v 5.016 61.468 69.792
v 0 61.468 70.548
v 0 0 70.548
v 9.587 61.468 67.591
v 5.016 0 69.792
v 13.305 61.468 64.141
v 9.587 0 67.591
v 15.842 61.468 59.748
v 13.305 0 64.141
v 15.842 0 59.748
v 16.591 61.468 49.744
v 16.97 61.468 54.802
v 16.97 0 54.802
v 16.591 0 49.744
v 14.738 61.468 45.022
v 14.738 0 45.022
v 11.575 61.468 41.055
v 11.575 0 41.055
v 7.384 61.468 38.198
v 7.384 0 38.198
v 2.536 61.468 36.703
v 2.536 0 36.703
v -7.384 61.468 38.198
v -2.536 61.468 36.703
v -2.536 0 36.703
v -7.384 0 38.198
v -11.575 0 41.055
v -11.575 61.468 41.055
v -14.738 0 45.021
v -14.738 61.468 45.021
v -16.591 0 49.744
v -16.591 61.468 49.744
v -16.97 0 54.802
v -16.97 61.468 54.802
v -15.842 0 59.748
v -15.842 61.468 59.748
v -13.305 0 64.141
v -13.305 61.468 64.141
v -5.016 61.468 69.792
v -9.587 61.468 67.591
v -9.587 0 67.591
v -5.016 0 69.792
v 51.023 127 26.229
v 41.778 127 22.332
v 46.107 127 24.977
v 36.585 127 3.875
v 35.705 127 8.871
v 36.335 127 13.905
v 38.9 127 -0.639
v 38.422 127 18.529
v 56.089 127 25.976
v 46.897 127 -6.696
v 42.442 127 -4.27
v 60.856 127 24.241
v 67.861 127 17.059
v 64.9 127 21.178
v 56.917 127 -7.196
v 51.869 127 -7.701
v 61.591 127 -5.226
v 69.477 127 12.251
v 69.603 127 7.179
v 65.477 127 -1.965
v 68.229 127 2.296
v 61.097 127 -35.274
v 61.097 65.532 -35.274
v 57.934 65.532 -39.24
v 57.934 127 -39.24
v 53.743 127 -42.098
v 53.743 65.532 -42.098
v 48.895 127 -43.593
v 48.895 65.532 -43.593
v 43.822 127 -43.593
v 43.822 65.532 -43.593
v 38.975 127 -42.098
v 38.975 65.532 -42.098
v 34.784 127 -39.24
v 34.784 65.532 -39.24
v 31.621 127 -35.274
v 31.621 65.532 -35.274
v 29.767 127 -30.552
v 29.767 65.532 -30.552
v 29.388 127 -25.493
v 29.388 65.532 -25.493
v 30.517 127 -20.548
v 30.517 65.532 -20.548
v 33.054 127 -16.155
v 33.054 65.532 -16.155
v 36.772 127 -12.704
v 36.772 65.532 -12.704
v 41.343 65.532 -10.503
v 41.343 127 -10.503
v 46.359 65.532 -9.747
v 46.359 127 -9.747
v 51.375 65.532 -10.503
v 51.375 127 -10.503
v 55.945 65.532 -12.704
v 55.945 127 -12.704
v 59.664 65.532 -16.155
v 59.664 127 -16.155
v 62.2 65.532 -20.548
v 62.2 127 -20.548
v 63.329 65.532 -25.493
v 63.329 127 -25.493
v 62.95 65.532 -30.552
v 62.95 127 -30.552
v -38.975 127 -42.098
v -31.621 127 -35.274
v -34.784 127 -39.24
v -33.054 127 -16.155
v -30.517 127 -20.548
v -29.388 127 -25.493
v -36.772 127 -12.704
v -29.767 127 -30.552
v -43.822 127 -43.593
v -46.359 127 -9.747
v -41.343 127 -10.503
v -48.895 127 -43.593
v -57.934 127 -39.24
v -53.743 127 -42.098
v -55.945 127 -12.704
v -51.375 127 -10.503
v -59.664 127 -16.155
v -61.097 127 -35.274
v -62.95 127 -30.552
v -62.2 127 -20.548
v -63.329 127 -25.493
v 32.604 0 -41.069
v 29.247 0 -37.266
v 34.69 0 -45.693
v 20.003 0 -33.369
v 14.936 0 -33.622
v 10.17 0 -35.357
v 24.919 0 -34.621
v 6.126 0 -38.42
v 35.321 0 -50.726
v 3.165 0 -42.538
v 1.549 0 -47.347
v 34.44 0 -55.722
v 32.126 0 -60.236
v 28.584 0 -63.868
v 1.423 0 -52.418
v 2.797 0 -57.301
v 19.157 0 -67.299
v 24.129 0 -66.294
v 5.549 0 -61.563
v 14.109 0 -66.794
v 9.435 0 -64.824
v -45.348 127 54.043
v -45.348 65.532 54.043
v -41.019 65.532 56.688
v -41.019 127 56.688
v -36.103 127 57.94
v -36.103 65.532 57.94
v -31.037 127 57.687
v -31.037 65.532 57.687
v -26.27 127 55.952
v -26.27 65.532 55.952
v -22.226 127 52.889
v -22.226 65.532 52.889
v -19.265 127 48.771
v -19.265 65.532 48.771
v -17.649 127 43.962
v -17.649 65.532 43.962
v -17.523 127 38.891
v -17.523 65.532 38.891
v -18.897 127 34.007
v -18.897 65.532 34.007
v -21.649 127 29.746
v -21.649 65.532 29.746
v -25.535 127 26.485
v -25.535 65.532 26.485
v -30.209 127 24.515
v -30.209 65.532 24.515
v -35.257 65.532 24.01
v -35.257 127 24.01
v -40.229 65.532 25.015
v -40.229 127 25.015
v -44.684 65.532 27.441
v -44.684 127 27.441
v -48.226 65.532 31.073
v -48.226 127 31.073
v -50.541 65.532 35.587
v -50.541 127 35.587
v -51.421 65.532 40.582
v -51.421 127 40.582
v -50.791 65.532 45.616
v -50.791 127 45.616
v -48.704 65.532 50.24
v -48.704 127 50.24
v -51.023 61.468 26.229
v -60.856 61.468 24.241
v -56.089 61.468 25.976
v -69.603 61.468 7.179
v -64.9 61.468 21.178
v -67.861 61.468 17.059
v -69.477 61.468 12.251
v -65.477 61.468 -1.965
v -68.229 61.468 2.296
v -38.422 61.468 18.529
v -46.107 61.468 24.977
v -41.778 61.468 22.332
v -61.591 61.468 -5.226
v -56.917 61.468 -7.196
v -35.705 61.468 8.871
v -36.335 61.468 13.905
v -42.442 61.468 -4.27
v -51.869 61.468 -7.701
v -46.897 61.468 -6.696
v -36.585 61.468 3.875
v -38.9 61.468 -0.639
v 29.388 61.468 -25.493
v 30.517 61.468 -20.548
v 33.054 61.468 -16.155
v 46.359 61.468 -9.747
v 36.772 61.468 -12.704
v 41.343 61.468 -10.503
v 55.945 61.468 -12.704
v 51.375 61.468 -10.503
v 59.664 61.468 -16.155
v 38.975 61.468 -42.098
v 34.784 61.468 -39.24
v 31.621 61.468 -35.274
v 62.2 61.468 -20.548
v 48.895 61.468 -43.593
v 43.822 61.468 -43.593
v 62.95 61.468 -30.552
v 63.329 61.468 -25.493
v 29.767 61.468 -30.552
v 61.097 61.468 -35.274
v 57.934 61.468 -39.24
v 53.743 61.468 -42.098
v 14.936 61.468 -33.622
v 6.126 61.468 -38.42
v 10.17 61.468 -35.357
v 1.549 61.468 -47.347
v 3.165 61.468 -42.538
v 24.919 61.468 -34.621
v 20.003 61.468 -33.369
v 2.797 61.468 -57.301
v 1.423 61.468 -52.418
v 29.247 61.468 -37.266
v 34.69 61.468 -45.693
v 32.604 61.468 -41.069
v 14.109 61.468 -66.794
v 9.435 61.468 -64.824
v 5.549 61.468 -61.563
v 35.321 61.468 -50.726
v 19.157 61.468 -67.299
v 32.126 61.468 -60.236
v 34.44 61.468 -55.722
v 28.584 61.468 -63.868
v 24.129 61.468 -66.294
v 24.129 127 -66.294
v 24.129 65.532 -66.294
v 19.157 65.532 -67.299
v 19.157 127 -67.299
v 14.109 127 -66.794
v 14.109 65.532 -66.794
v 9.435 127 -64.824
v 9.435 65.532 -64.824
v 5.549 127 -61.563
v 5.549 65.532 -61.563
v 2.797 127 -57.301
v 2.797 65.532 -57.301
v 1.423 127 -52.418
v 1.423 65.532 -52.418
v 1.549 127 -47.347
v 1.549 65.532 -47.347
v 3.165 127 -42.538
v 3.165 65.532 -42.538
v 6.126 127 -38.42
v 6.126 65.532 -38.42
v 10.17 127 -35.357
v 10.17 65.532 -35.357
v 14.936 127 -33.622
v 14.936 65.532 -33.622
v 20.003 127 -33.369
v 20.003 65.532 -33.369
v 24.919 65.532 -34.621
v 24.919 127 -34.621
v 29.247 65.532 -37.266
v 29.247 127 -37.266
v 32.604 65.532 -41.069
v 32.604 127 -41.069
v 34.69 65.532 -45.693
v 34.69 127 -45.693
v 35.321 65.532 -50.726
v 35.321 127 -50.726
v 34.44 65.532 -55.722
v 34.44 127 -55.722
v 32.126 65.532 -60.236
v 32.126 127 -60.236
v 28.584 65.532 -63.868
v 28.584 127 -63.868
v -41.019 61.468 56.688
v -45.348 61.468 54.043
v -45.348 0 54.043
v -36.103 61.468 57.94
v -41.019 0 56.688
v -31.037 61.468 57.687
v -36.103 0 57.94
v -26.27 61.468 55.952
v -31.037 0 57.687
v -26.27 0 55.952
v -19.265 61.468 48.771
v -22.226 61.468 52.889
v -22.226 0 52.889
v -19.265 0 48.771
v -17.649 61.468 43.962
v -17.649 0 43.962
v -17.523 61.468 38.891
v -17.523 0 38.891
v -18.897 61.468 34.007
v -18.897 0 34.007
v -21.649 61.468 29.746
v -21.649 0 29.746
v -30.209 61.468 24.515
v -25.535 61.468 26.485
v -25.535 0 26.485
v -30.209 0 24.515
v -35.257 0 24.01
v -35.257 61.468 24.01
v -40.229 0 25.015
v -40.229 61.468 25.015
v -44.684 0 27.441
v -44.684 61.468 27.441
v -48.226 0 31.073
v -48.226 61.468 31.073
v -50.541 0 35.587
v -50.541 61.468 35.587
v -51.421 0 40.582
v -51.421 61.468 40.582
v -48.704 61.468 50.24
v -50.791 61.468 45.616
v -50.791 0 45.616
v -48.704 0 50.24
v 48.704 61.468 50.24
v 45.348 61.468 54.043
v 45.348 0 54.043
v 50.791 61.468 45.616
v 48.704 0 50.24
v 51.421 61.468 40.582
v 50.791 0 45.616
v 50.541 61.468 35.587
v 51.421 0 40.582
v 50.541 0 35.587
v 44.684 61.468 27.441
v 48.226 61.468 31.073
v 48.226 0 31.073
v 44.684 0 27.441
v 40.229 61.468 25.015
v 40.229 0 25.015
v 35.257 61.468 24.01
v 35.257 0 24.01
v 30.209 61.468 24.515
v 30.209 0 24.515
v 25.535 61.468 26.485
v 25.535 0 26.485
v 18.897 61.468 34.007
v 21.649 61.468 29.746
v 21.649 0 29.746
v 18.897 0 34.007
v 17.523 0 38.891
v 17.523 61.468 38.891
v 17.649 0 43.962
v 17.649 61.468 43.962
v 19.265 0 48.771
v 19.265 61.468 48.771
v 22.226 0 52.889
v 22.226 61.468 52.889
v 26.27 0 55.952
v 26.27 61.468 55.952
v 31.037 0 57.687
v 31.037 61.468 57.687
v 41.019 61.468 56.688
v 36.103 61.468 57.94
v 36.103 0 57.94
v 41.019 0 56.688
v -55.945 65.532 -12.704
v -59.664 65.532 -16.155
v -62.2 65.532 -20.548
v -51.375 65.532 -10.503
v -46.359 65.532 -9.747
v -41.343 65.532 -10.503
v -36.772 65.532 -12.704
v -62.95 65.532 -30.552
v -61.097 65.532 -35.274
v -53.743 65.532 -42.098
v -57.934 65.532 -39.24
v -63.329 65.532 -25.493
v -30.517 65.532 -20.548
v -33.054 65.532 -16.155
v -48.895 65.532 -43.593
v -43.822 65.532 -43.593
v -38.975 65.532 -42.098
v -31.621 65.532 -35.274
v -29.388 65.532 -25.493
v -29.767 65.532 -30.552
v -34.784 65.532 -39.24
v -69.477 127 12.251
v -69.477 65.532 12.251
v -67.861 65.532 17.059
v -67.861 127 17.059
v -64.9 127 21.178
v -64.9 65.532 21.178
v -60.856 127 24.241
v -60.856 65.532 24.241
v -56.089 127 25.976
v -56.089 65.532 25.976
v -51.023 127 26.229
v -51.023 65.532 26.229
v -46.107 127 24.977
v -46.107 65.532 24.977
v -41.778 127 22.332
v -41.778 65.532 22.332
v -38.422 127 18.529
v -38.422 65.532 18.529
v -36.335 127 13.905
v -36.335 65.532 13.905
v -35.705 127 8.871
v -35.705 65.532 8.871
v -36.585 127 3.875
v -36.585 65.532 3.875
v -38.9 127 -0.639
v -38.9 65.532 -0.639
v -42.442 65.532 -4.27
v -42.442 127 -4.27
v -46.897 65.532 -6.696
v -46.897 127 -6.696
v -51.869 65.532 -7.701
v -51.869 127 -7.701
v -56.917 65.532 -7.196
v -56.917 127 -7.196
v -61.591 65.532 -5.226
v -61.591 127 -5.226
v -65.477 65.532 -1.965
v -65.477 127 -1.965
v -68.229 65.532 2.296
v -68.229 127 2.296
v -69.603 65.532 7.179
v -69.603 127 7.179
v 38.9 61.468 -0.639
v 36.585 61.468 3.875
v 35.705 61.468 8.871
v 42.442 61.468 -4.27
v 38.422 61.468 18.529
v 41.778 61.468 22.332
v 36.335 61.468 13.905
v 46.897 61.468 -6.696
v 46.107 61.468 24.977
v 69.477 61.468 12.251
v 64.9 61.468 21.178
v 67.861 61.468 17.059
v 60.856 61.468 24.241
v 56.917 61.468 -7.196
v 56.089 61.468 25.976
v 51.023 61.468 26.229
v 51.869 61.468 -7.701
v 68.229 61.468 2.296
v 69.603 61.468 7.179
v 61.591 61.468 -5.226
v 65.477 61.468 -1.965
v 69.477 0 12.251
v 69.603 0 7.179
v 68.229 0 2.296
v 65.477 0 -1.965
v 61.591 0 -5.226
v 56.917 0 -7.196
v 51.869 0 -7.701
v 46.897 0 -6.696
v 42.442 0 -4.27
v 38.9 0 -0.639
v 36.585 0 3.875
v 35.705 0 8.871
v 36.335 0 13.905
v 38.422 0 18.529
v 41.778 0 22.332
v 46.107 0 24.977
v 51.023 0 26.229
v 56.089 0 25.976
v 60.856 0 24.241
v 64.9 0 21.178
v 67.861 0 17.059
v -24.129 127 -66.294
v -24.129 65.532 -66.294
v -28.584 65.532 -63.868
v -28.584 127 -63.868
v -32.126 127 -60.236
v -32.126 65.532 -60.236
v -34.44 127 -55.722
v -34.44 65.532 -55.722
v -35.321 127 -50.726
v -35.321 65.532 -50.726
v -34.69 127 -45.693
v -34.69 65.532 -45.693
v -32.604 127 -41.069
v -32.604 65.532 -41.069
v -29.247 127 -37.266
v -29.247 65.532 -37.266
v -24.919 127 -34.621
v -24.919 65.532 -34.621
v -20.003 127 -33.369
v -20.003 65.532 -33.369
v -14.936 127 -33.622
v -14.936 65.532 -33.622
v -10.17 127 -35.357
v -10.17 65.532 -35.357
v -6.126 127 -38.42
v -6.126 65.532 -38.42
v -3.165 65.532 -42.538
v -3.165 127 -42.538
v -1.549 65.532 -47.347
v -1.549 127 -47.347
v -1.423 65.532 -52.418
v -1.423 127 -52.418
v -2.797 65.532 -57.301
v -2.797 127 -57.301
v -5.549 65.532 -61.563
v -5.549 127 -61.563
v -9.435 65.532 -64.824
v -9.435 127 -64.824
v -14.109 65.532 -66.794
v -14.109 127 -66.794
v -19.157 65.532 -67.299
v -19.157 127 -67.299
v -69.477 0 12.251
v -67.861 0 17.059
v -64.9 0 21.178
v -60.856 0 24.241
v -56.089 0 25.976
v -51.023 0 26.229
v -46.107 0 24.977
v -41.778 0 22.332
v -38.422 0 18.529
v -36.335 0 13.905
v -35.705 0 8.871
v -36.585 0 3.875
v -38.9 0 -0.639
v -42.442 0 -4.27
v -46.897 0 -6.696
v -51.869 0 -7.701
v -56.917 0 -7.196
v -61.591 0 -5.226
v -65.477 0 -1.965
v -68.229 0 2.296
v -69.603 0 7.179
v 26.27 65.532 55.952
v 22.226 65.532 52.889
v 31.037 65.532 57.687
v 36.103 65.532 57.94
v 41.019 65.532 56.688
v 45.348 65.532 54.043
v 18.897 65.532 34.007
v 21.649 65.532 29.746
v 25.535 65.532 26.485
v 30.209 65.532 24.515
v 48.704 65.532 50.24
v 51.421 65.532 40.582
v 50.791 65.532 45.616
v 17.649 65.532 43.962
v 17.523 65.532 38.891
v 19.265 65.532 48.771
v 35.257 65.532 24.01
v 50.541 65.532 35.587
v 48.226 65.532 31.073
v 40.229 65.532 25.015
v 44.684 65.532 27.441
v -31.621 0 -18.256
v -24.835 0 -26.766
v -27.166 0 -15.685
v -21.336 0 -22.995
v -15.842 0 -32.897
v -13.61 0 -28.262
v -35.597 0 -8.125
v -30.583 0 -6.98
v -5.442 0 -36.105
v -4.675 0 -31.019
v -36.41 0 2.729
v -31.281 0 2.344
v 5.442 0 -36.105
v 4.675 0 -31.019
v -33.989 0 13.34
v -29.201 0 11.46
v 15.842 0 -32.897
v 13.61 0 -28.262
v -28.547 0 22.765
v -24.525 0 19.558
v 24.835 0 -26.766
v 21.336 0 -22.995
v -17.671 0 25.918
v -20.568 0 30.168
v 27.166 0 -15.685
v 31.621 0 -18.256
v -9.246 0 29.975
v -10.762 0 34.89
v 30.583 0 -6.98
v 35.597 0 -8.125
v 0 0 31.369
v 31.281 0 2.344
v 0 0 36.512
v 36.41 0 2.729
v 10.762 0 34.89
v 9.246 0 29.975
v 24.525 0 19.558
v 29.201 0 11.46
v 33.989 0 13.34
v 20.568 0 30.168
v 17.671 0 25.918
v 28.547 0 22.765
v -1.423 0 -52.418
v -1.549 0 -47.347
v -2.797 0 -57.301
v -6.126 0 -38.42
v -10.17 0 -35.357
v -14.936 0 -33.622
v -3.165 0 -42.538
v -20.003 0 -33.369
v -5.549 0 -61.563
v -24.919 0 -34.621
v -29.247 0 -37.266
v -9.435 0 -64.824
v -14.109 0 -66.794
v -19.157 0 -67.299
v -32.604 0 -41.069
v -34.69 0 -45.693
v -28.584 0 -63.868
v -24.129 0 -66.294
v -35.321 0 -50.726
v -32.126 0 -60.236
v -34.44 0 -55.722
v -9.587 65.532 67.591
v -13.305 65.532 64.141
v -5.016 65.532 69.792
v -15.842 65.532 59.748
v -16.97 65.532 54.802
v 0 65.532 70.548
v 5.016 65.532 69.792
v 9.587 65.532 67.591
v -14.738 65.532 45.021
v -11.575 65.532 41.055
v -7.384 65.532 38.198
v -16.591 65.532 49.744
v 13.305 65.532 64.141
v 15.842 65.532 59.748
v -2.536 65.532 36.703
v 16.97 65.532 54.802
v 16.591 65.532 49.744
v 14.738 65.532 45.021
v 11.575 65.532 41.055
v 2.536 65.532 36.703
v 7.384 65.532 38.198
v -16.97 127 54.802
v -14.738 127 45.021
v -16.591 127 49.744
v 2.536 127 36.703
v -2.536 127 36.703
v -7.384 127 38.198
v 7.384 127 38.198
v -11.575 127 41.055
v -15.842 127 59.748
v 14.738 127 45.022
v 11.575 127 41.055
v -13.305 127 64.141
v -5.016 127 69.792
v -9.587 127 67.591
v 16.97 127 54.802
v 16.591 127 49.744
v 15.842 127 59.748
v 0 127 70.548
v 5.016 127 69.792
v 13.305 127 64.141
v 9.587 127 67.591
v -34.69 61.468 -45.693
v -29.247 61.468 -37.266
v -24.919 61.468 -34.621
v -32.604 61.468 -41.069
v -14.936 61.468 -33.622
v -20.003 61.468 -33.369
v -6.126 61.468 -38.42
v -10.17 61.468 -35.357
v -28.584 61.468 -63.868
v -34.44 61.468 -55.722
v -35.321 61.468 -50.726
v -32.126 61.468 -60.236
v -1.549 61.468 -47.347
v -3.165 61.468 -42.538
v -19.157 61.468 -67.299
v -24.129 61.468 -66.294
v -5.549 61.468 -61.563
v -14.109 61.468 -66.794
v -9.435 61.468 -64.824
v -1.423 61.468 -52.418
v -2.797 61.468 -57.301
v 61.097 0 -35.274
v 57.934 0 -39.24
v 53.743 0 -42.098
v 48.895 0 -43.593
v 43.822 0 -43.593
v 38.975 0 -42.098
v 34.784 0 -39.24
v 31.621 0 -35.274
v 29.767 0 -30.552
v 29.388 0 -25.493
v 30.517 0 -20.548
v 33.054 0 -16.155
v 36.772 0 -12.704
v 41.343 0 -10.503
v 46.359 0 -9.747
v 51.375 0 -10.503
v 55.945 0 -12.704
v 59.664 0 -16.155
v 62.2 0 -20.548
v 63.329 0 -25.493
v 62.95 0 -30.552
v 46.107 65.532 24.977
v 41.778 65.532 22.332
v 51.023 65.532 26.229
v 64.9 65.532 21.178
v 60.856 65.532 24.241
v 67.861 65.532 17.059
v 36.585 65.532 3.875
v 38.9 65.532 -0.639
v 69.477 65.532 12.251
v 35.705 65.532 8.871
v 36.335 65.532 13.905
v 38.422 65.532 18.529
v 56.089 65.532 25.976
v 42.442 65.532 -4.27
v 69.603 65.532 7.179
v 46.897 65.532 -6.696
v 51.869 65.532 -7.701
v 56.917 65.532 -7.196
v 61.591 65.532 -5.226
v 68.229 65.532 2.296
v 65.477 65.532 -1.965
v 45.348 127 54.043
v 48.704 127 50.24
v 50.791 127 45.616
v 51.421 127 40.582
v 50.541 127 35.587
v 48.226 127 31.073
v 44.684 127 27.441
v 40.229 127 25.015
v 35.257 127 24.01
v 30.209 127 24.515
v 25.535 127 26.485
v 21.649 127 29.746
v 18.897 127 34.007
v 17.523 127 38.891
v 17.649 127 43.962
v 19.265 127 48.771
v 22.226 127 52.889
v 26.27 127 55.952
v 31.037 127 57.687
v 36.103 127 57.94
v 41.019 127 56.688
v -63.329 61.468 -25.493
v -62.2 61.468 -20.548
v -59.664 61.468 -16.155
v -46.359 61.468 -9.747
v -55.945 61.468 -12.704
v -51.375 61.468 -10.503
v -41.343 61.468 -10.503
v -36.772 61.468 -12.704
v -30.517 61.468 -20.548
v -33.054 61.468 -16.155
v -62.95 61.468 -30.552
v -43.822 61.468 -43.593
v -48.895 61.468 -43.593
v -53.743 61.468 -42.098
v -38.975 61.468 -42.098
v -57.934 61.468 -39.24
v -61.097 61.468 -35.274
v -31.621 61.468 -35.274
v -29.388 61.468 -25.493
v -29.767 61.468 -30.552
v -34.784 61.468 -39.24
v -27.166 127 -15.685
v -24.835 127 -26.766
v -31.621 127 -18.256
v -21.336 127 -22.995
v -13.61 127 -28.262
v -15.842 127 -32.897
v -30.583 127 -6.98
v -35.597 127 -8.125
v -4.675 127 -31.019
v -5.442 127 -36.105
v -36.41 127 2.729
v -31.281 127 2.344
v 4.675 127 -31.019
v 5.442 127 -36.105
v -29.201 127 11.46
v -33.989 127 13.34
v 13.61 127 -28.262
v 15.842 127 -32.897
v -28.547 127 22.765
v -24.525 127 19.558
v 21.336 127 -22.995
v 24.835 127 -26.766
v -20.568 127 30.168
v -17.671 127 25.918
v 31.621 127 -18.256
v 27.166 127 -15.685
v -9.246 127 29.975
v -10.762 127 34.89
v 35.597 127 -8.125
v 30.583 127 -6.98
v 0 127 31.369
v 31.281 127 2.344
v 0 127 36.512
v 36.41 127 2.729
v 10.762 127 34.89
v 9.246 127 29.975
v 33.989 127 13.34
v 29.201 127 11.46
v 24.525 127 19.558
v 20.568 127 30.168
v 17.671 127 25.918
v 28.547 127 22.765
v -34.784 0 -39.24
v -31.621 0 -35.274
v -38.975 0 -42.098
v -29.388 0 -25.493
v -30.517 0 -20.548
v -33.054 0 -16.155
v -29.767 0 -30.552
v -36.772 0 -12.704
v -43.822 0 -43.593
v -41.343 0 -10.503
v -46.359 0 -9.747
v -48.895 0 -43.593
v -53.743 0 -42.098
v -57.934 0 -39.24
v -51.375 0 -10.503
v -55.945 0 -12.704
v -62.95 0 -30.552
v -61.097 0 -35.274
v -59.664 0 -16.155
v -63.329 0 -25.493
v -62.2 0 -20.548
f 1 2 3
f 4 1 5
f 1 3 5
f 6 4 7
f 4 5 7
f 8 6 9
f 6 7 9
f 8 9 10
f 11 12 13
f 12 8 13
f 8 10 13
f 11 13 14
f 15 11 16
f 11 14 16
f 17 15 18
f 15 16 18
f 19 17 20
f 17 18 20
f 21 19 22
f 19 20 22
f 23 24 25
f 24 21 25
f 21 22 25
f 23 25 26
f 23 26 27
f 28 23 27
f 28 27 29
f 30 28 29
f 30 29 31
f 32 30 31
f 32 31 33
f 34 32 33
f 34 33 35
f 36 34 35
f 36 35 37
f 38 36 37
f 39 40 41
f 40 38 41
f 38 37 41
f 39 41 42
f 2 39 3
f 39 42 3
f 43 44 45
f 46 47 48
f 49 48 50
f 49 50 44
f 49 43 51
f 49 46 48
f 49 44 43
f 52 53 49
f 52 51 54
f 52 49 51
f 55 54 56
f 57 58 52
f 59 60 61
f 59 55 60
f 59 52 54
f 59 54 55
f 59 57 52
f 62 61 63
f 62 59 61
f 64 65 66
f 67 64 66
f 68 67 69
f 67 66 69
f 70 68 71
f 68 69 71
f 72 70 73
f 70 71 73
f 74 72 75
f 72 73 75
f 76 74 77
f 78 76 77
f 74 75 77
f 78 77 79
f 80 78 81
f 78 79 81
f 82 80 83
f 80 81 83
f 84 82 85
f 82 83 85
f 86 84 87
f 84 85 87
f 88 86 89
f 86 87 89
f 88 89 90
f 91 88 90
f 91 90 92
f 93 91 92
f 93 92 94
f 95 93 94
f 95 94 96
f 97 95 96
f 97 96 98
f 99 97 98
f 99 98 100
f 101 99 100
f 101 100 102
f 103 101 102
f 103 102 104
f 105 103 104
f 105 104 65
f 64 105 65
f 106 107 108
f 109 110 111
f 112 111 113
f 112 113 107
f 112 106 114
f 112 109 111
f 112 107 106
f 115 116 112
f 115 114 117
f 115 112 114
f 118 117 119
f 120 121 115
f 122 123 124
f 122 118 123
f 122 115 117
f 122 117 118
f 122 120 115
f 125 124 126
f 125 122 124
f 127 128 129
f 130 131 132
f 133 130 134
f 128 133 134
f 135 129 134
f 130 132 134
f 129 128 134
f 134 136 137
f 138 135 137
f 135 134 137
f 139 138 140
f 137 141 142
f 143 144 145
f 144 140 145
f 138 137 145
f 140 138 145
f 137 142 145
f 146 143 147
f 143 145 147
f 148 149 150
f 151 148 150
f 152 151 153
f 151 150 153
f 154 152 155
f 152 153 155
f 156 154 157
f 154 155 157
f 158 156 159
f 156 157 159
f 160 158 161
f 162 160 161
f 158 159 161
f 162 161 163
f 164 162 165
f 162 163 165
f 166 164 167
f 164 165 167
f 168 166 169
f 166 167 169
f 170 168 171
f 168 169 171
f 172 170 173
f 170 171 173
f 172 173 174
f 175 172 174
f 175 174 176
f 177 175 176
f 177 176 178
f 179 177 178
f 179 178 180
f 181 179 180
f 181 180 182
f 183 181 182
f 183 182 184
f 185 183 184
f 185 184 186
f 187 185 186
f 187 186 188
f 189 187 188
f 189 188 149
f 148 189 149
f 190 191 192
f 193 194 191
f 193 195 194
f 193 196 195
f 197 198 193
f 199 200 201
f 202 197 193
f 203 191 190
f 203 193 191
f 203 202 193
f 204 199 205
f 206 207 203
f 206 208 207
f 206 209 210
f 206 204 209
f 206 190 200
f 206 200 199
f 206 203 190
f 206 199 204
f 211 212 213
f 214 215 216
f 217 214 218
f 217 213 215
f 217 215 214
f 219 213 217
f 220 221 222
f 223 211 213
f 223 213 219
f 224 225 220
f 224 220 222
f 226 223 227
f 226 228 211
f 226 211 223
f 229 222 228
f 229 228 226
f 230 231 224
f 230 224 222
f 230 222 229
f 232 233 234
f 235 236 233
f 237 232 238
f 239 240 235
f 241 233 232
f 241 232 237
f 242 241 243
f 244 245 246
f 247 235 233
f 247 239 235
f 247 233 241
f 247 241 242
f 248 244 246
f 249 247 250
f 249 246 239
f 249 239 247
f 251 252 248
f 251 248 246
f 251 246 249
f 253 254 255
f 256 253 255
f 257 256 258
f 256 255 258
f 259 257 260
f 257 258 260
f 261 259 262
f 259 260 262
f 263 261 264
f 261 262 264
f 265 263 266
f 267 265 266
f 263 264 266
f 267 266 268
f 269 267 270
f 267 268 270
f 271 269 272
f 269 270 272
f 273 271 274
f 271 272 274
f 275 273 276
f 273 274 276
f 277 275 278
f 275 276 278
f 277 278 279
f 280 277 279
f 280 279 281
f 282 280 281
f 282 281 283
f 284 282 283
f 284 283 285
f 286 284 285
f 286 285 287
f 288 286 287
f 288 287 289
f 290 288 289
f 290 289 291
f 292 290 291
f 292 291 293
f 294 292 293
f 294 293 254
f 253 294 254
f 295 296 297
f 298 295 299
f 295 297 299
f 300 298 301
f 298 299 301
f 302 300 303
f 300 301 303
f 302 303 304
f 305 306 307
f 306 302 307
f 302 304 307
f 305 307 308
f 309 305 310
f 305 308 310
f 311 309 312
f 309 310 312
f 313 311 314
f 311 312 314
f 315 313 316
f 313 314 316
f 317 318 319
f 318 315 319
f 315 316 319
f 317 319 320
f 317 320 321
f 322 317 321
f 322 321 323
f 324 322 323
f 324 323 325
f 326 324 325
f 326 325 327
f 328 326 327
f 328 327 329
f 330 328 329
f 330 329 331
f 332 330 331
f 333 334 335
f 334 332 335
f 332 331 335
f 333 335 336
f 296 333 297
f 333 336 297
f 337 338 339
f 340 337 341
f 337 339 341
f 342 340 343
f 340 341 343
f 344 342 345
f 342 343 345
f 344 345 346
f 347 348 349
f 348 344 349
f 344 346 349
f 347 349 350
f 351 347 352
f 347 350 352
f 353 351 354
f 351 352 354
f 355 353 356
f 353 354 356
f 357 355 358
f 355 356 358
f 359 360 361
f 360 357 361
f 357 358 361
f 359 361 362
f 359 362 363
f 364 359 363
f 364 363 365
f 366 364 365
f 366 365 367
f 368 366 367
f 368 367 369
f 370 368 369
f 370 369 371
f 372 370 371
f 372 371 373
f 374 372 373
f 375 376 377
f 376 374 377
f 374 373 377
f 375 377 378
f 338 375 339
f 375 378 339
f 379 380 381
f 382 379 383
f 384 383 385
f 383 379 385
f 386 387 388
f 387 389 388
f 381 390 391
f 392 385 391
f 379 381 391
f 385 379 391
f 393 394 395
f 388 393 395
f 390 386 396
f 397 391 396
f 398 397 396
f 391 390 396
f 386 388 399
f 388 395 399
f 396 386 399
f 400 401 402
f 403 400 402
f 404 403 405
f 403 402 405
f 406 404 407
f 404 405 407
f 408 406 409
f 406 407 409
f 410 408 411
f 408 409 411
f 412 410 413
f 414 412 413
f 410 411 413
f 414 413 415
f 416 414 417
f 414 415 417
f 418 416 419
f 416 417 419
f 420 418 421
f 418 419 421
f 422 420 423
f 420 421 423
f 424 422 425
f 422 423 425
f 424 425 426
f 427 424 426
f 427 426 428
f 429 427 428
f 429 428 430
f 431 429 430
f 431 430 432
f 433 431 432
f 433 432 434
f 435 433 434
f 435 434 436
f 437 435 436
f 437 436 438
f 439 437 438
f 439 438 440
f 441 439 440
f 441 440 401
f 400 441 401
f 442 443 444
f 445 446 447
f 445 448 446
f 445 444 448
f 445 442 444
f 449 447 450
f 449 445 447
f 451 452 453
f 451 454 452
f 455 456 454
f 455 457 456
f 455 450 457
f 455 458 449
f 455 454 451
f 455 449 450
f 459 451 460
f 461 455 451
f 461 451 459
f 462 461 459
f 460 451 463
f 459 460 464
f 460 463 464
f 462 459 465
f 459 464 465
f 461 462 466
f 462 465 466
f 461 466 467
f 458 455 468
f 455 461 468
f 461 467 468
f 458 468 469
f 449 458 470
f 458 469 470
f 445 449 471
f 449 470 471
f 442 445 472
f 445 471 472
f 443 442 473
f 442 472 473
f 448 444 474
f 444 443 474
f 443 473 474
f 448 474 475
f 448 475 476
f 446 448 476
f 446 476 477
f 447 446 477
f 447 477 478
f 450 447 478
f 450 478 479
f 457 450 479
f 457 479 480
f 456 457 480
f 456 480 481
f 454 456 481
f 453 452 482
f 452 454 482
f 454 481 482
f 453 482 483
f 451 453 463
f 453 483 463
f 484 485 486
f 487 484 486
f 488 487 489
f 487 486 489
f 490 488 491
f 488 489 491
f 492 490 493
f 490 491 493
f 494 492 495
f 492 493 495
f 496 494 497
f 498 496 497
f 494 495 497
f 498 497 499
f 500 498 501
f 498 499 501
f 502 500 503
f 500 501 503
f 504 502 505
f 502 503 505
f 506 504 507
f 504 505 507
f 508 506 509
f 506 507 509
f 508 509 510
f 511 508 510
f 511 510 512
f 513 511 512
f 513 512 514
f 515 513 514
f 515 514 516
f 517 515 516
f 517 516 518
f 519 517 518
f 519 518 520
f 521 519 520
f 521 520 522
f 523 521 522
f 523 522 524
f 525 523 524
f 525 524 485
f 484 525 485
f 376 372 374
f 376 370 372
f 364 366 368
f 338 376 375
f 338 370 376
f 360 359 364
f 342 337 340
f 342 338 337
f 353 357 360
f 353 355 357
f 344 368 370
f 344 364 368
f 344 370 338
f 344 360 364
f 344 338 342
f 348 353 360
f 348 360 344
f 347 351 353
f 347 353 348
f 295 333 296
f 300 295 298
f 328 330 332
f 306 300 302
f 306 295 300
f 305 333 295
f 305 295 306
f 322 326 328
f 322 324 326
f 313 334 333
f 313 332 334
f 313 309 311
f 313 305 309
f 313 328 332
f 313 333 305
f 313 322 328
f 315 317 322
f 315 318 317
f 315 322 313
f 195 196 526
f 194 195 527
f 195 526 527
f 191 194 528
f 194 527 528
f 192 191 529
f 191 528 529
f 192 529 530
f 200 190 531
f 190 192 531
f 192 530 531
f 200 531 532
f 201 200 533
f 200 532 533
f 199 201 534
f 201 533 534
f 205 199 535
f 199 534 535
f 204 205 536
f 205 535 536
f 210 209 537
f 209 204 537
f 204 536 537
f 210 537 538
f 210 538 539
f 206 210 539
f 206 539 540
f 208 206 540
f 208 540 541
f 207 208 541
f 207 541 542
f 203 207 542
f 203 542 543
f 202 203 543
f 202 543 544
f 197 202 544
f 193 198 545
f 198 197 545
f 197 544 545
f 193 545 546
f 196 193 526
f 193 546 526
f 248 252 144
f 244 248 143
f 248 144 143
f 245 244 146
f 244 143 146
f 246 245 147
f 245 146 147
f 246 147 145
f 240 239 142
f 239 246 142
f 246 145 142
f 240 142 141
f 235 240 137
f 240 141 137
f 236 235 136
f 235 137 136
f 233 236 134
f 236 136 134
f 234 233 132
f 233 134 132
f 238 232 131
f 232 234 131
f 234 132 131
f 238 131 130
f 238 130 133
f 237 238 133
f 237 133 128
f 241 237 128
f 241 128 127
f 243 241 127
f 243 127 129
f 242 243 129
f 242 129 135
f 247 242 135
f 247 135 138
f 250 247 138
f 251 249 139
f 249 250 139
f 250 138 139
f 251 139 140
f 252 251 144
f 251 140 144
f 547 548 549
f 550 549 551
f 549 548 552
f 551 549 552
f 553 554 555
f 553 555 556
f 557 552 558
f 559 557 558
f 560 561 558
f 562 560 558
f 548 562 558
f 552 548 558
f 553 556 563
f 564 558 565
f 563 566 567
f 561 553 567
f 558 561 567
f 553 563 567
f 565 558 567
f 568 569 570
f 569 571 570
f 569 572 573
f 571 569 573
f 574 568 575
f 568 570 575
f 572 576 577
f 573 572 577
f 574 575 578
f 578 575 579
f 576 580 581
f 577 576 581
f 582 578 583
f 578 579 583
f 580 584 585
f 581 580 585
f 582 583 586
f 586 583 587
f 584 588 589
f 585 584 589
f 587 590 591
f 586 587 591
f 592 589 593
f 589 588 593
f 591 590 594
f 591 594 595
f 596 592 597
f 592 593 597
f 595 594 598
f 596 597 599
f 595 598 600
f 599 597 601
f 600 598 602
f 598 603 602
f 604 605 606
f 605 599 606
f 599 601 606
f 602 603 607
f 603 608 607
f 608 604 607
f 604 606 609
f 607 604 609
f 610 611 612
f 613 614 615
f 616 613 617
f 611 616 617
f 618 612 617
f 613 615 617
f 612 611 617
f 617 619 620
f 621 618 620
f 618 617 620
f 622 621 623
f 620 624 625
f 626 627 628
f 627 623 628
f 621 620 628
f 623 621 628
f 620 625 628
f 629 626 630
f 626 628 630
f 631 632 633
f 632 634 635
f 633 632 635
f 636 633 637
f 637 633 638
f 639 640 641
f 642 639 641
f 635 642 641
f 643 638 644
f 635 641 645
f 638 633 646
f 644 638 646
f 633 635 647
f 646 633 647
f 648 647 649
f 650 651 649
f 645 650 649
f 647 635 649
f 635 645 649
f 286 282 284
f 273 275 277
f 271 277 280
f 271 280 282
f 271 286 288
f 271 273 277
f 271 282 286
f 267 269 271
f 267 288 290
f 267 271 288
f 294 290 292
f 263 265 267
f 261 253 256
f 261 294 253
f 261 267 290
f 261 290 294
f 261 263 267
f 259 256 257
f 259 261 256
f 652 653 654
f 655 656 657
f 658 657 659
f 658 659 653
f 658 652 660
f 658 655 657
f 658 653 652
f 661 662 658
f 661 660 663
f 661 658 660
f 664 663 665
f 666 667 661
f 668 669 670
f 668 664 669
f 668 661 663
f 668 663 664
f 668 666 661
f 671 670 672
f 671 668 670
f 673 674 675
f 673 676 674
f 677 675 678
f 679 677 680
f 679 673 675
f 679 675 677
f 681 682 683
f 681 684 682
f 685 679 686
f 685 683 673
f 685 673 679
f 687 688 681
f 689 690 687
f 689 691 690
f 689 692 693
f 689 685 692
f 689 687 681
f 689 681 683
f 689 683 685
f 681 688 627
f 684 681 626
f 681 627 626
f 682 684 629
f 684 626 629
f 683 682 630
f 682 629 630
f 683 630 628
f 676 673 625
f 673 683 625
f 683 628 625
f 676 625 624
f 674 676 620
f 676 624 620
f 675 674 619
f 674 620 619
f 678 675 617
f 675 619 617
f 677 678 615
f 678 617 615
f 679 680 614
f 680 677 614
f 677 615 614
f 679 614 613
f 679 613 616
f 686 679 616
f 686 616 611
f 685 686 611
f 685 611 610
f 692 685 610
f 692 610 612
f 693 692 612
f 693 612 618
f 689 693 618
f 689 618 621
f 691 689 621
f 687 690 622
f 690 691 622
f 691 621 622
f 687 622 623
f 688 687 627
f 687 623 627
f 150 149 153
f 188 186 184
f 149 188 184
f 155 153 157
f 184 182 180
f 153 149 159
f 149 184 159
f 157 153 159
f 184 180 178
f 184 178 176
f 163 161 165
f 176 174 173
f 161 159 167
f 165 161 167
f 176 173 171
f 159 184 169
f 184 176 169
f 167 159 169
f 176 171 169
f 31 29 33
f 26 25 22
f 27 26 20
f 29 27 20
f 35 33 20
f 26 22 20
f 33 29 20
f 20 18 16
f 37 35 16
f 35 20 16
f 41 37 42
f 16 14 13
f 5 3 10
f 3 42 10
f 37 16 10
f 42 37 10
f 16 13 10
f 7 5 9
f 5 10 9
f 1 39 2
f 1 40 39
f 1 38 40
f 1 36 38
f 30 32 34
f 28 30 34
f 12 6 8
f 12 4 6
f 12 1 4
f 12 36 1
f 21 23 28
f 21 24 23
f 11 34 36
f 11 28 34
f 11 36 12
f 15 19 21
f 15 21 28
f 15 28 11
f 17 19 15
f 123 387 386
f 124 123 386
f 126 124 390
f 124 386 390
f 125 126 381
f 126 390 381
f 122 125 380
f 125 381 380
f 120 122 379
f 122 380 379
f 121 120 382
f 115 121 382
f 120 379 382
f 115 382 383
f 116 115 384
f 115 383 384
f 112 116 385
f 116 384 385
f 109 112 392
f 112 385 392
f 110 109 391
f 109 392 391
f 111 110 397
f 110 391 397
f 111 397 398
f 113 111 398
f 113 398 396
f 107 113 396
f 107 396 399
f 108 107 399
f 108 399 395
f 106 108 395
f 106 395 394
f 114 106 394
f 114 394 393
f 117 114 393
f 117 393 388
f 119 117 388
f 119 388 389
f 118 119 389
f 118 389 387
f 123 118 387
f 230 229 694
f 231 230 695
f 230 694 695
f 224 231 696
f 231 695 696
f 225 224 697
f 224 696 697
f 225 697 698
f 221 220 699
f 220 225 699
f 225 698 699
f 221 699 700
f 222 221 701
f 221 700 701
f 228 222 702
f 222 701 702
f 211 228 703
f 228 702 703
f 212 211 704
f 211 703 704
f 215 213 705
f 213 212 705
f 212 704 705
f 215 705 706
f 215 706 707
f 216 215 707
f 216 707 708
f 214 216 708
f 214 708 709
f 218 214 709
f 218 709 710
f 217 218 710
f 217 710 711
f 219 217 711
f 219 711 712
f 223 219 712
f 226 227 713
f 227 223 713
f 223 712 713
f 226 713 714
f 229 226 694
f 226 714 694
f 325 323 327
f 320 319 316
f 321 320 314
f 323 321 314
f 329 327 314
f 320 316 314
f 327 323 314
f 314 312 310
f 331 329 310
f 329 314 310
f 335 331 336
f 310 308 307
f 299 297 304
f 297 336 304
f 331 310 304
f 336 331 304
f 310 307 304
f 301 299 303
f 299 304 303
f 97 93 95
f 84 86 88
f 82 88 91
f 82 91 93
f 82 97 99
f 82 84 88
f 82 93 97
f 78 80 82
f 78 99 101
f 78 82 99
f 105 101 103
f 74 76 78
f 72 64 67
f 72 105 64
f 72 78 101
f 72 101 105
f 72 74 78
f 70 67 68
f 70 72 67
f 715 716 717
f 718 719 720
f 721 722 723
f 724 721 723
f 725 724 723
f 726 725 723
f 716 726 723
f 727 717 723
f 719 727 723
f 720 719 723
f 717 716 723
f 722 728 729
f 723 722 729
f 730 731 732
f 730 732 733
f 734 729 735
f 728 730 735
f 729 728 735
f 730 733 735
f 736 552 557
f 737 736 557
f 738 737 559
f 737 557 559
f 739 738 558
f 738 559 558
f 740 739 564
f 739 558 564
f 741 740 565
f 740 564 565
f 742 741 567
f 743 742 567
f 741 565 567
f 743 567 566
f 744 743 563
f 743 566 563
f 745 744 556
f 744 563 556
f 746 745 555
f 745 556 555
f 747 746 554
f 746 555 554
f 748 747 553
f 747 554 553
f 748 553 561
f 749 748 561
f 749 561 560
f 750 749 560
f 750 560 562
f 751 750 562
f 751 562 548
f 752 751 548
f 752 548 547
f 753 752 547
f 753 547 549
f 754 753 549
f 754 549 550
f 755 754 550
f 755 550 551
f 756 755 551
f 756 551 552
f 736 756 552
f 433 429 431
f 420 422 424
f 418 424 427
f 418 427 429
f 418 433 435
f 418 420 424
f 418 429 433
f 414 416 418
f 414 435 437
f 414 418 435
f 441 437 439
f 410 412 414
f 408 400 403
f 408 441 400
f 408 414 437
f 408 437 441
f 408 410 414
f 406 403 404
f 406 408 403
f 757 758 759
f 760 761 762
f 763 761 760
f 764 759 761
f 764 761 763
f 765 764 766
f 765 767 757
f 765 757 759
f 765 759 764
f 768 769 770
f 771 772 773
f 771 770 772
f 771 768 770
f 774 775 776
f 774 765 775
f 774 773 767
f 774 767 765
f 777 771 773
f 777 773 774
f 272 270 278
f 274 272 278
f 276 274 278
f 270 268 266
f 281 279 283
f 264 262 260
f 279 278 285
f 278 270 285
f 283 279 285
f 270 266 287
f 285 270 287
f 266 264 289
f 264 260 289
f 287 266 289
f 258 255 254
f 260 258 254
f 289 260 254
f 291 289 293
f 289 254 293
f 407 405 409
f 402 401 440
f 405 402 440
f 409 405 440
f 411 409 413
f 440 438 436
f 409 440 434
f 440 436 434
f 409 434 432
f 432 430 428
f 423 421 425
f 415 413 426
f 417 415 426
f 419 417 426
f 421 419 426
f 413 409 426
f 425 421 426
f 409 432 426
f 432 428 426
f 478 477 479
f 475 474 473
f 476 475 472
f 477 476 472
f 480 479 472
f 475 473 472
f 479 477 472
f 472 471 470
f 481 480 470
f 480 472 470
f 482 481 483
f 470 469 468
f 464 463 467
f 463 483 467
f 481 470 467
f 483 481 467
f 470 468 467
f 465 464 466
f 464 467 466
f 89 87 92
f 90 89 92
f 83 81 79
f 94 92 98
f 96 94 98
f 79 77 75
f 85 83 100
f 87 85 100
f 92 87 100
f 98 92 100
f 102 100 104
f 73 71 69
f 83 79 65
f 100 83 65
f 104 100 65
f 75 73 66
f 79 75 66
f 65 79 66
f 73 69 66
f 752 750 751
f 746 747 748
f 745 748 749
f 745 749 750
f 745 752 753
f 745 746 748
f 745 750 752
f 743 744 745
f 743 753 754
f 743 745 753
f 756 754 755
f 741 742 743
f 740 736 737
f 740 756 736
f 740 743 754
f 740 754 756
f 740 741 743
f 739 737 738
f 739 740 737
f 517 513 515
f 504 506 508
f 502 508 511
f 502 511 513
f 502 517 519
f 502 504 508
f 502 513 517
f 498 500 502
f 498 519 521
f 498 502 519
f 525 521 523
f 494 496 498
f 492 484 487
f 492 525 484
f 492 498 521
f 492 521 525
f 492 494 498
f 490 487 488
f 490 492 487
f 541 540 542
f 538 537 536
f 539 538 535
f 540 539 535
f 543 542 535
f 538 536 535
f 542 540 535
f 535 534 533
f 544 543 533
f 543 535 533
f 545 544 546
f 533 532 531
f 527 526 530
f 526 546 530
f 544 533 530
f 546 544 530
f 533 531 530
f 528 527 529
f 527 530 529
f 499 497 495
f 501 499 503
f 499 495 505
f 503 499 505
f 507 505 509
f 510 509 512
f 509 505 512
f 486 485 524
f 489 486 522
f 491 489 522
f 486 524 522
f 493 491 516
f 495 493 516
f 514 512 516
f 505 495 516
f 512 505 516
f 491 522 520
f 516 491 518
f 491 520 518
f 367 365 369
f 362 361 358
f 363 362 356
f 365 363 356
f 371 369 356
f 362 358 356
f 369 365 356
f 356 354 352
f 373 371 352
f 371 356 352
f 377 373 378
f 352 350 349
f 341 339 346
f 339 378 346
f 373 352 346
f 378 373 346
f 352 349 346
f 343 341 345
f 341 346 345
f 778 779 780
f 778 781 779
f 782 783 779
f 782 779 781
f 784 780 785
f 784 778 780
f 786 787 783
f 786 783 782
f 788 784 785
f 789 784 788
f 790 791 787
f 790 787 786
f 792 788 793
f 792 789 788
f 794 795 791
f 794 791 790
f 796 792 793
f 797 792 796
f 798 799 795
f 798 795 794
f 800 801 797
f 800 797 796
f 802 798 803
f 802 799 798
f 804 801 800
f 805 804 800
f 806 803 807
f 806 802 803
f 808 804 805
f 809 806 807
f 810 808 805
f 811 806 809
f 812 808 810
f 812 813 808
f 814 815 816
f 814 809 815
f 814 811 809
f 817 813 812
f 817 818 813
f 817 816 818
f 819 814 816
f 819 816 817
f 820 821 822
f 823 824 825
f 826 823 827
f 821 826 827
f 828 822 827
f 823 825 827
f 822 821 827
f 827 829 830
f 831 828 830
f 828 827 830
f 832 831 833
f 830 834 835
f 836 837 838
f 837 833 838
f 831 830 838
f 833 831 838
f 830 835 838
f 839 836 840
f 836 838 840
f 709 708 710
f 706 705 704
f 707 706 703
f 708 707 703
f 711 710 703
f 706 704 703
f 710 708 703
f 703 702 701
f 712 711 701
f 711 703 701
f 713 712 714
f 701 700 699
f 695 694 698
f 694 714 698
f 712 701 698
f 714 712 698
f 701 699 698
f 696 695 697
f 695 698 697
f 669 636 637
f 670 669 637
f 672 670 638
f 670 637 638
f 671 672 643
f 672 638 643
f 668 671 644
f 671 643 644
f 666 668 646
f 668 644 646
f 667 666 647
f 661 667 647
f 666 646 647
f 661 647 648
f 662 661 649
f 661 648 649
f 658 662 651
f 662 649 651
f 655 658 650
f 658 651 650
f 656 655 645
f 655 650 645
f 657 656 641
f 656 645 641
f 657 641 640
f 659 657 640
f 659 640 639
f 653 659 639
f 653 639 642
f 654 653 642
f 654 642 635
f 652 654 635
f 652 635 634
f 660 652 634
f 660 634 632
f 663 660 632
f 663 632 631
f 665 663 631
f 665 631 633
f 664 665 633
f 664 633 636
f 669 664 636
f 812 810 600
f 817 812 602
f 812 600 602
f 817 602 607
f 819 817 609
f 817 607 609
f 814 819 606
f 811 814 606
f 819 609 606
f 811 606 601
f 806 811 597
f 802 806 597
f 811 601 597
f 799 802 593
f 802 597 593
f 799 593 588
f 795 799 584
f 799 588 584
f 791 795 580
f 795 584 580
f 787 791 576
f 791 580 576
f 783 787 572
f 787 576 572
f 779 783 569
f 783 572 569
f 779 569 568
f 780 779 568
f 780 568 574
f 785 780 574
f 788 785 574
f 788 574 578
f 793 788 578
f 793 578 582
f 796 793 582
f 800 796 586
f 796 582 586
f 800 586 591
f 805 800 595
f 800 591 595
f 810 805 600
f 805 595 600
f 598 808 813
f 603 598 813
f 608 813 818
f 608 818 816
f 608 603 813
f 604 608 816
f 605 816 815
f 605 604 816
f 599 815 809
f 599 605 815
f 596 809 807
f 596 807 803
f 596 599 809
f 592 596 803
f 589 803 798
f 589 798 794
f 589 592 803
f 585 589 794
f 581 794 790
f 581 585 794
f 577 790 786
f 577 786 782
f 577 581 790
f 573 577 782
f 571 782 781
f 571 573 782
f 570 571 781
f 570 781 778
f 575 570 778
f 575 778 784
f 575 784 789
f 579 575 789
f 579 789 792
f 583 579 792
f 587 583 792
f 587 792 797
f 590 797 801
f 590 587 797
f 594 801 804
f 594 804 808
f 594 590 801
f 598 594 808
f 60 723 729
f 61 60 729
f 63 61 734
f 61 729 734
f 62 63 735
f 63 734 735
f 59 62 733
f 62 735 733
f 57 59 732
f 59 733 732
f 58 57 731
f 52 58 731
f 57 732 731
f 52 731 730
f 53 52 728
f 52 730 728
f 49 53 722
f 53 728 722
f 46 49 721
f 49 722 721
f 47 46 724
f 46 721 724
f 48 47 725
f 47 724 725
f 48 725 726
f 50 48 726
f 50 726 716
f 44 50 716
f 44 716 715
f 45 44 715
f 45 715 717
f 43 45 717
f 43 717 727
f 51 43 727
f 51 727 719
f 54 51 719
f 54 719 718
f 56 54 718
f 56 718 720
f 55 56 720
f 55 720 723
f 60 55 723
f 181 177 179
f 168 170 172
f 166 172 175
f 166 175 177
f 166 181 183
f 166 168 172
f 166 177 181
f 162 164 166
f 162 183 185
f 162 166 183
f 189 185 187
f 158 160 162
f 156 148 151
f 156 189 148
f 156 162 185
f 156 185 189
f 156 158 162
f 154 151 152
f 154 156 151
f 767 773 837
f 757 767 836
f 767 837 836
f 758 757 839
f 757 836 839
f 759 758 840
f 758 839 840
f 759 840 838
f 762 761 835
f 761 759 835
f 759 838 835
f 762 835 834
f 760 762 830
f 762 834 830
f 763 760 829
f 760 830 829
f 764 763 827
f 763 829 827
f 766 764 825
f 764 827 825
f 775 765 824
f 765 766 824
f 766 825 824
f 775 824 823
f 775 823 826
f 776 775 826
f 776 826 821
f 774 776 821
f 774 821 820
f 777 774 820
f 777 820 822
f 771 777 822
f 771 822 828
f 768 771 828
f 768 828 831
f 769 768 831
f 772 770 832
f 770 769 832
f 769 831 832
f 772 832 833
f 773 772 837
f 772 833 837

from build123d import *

# Parameters (mm, degrees)
SKETCH1_R               = 36.5125
SKETCH1_R_2             = 31.369
BOSS_EXTRUDE1_DEPTH     = 127
SKETCH2_R               = 17.018
BOSS_EXTRUDE2_DEPTH     = 127
CIRPATTERN3_COUNT       = 9
CUT_EXTRUDE1_DEPTH      = 2.032
CUT_EXTRUDE1_DEPTH_BACK = 2.032
SKETCH5_R               = 70.5485
SKETCH5_R_2             = 36.5125


with BuildPart() as part:
    # Sketch1 → Boss-Extrude1 (new body)
    with BuildSketch(Plane(origin=(0, 0, 0), x_dir=(1, 0, 0), z_dir=(0, 1, 0))):
        with Locations(Location((0, 0, 0), (0, 0, 270))):
            Circle(SKETCH1_R)
        with Locations(Location((0, 0, 0), (0, 0, 270))):
            Circle(SKETCH1_R_2, mode=Mode.SUBTRACT)
    extrude(amount=BOSS_EXTRUDE1_DEPTH)


with BuildPart() as body_2:
    # Sketch2 → Boss-Extrude2 (new body)
    with BuildSketch(Plane(origin=(0, 0, 0), x_dir=(1, 0, 0), z_dir=(0, 1, 0))):
        with Locations(Location((0, -53.5305, 0), (0, 0, 270))):
            Circle(SKETCH2_R)
    extrude(amount=BOSS_EXTRUDE2_DEPTH)


with BuildPart() as cirpattern3_1:
    # CirPattern3: pattern copy
    add(body_2.part.rotate(Axis((0, 0, 0), (0, 1, 0)), 1 * 360 / CIRPATTERN3_COUNT))


with BuildPart() as cirpattern3_2:
    # CirPattern3: pattern copy
    add(body_2.part.rotate(Axis((0, 0, 0), (0, 1, 0)), 2 * 360 / CIRPATTERN3_COUNT))


with BuildPart() as cirpattern3_3:
    # CirPattern3: pattern copy
    add(body_2.part.rotate(Axis((0, 0, 0), (0, 1, 0)), 3 * 360 / CIRPATTERN3_COUNT))


with BuildPart() as cirpattern3_4:
    # CirPattern3: pattern copy
    add(body_2.part.rotate(Axis((0, 0, 0), (0, 1, 0)), 4 * 360 / CIRPATTERN3_COUNT))


with BuildPart() as cirpattern3_5:
    # CirPattern3: pattern copy
    add(body_2.part.rotate(Axis((0, 0, 0), (0, 1, 0)), 5 * 360 / CIRPATTERN3_COUNT))


with BuildPart() as cirpattern3_6:
    # CirPattern3: pattern copy
    add(body_2.part.rotate(Axis((0, 0, 0), (0, 1, 0)), 6 * 360 / CIRPATTERN3_COUNT))


with BuildPart() as cirpattern3_7:
    # CirPattern3: pattern copy
    add(body_2.part.rotate(Axis((0, 0, 0), (0, 1, 0)), 7 * 360 / CIRPATTERN3_COUNT))


with BuildPart() as cirpattern3_8:
    # CirPattern3: pattern copy
    add(body_2.part.rotate(Axis((0, 0, 0), (0, 1, 0)), 8 * 360 / CIRPATTERN3_COUNT))


with BuildPart() as cut_extrude1_tool:
    # Sketch5 → Cut-Extrude1 (new, two sides: drawn at the far end of the back side and taken through both)
    with BuildSketch(Plane(origin=(0, 63.5, 0), x_dir=(1, 0, 0), z_dir=(0, 1, 0)).offset(-CUT_EXTRUDE1_DEPTH_BACK)):
        Circle(SKETCH5_R)
        with Locations(Location((0, 0, 0), (0, 0, 270))):
            Circle(SKETCH5_R_2, mode=Mode.SUBTRACT)
    extrude(amount=CUT_EXTRUDE1_DEPTH + CUT_EXTRUDE1_DEPTH_BACK)


with BuildPart() as body_2_1:
    add(body_2.part)

    # Cut-Extrude1: cut by cut_extrude1_tool
    add(cut_extrude1_tool.part, mode=Mode.SUBTRACT)


with BuildPart() as cirpattern3_1_1:
    add(cirpattern3_1.part)

    # Cut-Extrude1: cut by cut_extrude1_tool
    add(cut_extrude1_tool.part, mode=Mode.SUBTRACT)


with BuildPart() as cirpattern3_2_1:
    add(cirpattern3_2.part)

    # Cut-Extrude1: cut by cut_extrude1_tool
    add(cut_extrude1_tool.part, mode=Mode.SUBTRACT)


with BuildPart() as cirpattern3_3_1:
    add(cirpattern3_3.part)

    # Cut-Extrude1: cut by cut_extrude1_tool
    add(cut_extrude1_tool.part, mode=Mode.SUBTRACT)


with BuildPart() as cirpattern3_4_1:
    add(cirpattern3_4.part)

    # Cut-Extrude1: cut by cut_extrude1_tool
    add(cut_extrude1_tool.part, mode=Mode.SUBTRACT)


with BuildPart() as cirpattern3_5_1:
    add(cirpattern3_5.part)

    # Cut-Extrude1: cut by cut_extrude1_tool
    add(cut_extrude1_tool.part, mode=Mode.SUBTRACT)


with BuildPart() as cirpattern3_6_1:
    add(cirpattern3_6.part)

    # Cut-Extrude1: cut by cut_extrude1_tool
    add(cut_extrude1_tool.part, mode=Mode.SUBTRACT)


with BuildPart() as cirpattern3_7_1:
    add(cirpattern3_7.part)

    # Cut-Extrude1: cut by cut_extrude1_tool
    add(cut_extrude1_tool.part, mode=Mode.SUBTRACT)


with BuildPart() as cirpattern3_8_1:
    add(cirpattern3_8.part)

    # Cut-Extrude1: cut by cut_extrude1_tool
    add(cut_extrude1_tool.part, mode=Mode.SUBTRACT)


solid = Compound([part.part, body_2_1.part, cirpattern3_1_1.part, cirpattern3_2_1.part, cirpattern3_3_1.part, cirpattern3_4_1.part, cirpattern3_5_1.part, cirpattern3_6_1.part, cirpattern3_7_1.part, cirpattern3_8_1.part])
